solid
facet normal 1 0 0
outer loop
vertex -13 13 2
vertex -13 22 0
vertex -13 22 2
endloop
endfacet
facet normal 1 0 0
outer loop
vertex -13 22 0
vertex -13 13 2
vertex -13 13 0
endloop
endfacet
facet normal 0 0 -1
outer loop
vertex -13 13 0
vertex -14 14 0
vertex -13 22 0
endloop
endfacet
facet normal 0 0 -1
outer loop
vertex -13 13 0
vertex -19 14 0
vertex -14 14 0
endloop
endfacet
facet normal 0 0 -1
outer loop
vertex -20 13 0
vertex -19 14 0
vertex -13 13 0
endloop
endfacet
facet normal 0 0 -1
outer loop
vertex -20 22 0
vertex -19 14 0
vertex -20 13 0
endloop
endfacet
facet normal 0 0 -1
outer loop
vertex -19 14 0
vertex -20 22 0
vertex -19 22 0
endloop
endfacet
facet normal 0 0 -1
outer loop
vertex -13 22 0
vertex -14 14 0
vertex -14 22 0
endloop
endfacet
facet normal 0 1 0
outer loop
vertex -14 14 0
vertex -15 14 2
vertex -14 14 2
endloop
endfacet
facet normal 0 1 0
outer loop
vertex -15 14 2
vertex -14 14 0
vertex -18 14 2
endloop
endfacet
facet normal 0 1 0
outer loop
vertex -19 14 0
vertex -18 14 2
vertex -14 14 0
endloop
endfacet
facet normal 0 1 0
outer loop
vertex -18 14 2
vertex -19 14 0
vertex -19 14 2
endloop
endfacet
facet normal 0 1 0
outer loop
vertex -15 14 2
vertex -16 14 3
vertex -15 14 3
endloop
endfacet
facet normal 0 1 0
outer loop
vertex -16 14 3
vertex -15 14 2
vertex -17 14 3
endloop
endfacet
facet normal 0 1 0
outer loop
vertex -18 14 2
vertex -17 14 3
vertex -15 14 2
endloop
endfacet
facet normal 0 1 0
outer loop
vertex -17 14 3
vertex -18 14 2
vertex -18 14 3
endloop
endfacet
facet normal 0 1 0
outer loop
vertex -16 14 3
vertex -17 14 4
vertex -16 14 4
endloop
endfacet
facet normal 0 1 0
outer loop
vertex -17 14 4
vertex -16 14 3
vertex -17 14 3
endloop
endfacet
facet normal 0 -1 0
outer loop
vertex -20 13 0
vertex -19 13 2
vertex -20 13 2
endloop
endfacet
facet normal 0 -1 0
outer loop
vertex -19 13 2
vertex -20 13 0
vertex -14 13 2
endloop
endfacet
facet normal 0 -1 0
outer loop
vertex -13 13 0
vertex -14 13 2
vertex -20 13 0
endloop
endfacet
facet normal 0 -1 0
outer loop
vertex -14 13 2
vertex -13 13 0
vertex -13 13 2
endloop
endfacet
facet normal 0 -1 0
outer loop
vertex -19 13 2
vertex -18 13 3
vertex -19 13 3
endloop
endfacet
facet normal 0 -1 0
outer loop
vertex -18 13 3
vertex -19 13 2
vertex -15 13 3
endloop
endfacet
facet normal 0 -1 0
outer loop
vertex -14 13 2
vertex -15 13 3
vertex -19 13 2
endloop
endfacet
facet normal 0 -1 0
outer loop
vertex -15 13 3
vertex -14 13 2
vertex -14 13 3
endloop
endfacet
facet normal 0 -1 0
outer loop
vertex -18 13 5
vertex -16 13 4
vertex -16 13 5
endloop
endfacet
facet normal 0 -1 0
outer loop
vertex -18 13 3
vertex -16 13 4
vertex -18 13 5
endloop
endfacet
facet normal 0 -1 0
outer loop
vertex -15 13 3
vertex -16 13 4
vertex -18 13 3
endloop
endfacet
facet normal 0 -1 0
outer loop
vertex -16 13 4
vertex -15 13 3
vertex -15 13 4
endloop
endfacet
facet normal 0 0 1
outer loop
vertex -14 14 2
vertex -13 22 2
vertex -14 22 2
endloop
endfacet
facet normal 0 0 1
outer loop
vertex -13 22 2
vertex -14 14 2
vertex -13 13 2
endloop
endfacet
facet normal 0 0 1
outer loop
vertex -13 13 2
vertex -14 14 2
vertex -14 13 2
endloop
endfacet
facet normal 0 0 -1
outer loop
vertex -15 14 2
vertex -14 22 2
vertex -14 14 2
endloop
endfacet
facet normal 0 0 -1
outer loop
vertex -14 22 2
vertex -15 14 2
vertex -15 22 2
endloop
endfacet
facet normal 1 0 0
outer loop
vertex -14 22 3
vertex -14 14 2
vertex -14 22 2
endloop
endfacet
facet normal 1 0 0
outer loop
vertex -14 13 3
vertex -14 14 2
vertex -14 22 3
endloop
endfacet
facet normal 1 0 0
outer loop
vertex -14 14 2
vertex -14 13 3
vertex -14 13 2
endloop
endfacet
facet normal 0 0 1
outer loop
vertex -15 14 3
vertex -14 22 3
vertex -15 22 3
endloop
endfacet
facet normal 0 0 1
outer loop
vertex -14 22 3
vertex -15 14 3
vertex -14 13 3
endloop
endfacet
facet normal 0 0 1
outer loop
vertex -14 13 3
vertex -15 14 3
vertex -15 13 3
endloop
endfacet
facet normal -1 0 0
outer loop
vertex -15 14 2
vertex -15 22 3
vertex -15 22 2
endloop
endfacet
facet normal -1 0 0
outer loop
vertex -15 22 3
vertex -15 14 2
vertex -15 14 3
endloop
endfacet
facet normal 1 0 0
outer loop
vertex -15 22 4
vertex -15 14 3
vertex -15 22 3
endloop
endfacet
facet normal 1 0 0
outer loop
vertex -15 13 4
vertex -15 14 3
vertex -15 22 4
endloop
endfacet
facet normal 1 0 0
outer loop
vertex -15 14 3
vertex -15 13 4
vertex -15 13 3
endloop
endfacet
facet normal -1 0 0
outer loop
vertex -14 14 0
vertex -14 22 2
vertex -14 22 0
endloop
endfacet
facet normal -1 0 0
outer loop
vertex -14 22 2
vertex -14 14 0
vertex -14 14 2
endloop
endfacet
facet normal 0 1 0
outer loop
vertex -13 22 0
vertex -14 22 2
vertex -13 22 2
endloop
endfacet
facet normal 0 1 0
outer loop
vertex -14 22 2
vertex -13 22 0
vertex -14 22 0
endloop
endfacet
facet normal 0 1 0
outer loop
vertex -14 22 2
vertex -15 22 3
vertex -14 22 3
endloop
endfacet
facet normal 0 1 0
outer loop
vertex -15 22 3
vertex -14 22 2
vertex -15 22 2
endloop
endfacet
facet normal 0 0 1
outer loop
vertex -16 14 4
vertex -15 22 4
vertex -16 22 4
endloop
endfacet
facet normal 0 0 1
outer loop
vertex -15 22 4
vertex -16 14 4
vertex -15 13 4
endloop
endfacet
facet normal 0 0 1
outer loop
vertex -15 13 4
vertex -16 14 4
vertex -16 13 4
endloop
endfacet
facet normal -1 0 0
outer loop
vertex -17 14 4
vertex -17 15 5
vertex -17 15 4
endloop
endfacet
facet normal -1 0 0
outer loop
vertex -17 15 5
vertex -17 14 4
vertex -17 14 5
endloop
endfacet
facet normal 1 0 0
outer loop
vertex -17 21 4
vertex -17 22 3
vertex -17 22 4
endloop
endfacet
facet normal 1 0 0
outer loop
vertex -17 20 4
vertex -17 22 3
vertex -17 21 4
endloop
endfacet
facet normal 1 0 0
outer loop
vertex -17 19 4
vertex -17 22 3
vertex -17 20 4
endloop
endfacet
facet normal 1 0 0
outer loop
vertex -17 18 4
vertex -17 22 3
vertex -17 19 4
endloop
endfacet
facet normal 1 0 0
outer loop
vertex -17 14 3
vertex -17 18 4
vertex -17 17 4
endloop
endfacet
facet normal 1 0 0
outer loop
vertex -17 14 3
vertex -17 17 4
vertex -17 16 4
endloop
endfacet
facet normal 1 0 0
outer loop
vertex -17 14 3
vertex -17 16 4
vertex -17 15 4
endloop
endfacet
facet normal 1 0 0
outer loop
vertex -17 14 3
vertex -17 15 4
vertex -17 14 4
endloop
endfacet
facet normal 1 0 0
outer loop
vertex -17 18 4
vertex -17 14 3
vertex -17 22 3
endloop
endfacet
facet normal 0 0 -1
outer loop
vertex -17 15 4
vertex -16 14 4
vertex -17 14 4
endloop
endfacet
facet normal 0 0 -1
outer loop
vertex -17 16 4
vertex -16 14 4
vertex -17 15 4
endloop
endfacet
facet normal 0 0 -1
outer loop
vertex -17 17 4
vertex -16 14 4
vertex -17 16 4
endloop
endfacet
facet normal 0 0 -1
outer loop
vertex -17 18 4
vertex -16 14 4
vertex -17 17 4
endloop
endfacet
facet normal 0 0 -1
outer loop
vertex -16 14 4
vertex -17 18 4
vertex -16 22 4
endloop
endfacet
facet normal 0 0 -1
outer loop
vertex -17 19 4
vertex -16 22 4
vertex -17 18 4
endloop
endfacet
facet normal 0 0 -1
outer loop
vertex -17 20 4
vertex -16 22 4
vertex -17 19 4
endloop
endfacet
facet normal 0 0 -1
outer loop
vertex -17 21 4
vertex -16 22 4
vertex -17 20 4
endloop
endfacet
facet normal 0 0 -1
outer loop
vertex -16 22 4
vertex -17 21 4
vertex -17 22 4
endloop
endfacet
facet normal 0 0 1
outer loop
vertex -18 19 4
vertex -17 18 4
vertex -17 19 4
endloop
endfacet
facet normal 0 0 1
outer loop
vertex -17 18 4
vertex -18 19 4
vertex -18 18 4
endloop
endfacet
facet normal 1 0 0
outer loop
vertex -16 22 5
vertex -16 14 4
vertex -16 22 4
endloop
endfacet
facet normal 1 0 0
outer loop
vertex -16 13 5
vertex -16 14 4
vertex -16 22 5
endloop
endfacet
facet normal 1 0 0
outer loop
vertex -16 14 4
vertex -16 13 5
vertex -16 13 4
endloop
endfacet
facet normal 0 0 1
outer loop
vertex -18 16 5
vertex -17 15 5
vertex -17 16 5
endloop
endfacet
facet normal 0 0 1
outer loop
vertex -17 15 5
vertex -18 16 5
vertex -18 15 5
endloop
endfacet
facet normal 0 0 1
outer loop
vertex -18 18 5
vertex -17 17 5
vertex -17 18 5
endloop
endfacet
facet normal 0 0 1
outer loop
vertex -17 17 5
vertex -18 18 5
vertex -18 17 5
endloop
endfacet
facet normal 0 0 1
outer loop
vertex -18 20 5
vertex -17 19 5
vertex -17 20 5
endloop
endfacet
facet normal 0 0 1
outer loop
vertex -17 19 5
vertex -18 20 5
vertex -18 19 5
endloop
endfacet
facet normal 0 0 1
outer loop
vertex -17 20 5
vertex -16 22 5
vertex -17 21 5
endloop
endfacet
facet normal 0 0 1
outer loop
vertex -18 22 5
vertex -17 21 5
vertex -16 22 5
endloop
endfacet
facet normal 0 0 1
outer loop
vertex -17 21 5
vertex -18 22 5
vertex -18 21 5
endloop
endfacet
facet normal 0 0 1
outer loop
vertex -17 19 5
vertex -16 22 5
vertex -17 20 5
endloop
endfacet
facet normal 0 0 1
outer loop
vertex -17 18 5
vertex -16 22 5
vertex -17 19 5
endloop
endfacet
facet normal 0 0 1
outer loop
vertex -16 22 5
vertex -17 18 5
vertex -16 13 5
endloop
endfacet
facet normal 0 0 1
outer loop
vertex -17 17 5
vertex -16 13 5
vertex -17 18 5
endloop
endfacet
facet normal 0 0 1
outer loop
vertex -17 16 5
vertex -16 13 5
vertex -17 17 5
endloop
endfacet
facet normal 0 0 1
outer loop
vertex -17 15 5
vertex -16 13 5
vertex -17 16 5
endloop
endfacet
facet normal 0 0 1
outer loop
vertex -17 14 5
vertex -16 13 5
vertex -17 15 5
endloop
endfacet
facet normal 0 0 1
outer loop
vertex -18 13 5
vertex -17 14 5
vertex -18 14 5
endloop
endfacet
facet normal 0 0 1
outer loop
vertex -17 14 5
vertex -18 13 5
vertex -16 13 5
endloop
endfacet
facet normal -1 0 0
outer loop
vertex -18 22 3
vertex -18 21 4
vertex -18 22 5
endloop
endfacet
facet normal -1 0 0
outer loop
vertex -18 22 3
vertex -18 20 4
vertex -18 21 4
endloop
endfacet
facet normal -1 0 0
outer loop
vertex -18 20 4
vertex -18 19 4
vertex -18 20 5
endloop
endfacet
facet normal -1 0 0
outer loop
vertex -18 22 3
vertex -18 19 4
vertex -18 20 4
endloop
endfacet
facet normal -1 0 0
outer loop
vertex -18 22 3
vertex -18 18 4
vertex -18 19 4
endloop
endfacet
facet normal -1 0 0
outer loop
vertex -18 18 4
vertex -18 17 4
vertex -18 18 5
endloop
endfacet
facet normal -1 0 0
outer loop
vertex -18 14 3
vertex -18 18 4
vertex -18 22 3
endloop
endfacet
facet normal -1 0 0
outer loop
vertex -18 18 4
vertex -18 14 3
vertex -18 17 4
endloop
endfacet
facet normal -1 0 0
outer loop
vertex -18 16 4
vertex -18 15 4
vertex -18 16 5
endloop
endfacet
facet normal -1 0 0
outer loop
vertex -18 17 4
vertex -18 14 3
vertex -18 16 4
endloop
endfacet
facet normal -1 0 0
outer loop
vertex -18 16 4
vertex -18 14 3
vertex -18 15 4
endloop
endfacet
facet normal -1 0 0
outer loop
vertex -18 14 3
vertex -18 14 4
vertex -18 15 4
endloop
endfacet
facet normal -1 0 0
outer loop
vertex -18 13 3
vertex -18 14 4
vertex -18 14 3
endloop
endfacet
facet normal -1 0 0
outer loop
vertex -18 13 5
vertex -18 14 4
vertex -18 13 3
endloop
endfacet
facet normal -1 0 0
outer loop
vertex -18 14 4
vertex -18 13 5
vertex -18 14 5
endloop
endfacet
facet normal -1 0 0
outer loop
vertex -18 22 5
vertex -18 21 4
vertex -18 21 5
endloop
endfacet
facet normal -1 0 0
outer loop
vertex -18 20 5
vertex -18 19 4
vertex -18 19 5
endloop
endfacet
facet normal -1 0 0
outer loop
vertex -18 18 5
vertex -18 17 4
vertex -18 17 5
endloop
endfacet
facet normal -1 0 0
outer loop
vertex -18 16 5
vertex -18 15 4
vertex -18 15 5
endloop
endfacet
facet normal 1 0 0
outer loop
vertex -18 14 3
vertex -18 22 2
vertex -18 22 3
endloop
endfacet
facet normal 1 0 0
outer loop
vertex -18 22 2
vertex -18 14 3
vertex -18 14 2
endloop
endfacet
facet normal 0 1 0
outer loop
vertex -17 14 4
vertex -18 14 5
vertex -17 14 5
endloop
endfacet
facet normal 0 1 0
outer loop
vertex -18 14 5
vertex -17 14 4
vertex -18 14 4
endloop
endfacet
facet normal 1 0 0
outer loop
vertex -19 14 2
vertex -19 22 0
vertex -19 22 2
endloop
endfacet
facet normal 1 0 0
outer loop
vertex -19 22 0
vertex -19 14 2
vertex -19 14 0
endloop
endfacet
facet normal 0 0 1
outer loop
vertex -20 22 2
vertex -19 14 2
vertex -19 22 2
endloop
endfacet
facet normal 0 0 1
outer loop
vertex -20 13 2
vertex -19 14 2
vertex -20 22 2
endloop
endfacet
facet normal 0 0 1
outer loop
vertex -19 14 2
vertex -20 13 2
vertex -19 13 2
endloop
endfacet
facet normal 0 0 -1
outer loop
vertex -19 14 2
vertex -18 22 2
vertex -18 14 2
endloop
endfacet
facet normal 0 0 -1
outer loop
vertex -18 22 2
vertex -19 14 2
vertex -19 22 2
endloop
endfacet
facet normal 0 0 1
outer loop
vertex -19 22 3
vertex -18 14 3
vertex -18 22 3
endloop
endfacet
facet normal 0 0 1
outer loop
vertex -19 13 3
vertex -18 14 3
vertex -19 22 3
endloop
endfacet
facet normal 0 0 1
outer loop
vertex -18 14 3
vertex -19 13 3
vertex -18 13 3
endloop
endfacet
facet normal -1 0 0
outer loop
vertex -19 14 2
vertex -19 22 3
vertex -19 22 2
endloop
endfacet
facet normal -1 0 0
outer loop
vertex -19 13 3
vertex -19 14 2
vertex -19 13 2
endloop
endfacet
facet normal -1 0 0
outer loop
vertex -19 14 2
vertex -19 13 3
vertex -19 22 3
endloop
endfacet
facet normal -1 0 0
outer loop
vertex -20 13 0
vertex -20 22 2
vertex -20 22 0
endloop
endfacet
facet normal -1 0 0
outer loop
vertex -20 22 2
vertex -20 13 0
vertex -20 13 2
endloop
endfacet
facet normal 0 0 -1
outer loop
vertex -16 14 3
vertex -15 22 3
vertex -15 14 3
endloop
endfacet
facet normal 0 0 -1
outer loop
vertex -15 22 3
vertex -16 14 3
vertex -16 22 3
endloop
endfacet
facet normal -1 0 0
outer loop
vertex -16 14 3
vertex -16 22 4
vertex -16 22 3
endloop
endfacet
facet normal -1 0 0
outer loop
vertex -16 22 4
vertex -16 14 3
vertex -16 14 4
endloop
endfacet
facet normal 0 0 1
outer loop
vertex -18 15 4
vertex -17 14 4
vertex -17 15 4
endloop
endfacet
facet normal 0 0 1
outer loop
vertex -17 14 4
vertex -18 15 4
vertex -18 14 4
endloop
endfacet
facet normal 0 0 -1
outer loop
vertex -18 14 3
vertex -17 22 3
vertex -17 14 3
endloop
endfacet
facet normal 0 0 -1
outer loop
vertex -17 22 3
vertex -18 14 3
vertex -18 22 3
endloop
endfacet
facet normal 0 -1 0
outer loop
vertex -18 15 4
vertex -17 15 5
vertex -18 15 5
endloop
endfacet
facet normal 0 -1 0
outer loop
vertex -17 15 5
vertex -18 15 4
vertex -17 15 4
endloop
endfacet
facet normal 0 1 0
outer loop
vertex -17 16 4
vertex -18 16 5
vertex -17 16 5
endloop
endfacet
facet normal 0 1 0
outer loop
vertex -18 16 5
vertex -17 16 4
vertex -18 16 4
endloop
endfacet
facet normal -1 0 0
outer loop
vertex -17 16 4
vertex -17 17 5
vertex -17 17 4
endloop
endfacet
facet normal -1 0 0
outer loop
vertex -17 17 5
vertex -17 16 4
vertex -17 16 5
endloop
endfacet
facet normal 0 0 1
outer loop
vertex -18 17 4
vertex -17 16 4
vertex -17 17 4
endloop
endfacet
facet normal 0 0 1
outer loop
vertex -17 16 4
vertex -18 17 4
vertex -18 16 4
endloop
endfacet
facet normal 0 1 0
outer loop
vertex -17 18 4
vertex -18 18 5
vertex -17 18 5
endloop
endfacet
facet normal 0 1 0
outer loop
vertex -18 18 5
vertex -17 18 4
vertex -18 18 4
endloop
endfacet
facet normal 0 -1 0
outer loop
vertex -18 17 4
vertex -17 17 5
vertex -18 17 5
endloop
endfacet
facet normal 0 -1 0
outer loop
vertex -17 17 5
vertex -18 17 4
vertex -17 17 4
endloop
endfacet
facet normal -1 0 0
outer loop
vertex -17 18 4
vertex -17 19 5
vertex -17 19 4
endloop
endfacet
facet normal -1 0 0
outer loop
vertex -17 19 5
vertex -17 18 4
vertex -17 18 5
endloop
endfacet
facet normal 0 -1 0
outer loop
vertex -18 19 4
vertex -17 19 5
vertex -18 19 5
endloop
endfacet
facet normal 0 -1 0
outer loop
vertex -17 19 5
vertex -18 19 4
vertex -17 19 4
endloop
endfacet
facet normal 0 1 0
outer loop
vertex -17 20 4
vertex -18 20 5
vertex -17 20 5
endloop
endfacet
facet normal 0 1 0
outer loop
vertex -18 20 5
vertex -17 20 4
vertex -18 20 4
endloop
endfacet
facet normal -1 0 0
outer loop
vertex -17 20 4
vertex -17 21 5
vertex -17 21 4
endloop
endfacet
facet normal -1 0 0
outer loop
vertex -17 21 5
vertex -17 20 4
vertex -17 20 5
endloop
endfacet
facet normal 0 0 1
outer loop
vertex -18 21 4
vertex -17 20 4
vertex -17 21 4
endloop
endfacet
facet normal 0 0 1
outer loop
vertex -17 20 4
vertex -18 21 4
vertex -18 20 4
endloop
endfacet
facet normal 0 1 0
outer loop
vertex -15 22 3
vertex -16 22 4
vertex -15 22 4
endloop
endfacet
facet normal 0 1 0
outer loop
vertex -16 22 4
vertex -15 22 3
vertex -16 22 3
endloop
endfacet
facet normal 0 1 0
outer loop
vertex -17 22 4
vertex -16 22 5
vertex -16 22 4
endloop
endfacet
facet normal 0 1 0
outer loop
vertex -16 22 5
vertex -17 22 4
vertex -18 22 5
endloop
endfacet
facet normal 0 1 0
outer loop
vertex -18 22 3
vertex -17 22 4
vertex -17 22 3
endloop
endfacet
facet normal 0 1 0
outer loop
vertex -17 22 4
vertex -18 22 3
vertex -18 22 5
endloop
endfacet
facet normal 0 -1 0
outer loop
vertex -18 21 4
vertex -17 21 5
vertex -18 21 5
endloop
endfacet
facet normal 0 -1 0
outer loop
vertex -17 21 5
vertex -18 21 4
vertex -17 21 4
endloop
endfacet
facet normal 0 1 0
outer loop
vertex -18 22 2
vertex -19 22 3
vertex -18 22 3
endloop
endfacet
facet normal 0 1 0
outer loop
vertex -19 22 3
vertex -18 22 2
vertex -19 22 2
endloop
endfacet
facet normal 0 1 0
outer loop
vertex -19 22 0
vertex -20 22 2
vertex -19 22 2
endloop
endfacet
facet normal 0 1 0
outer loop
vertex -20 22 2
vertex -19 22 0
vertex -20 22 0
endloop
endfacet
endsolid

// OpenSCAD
fastRender = true;

$fn = 8;
module minecraftCube(x,y,z,colorIn)
{
    if(fastRender == true)
    {
        color(colorIn) translate([x,y,z]) cube(1);
    }
    else
    {
        color(colorIn) translate([x,y,z])
        minkowski()
        {
            cube(0.65);
            sphere(d = 0.65);
        }
    }
}
// chunkX = 12, chunkZ = 5, offsetX = 0, offsetZ = 0
minecraftCube(-14,13,0,[0.3200,0.3200,0.3200]);// granite
minecraftCube(-14,13,1,[0.3200,0.3200,0.3200]);// granite
minecraftCube(-15,13,0,[0.3200,0.3200,0.3200]);// granite
minecraftCube(-15,13,1,[0.3200,0.3200,0.3200]);// granite
minecraftCube(-15,13,2,[0.3200,0.3200,0.3200]);// granite
minecraftCube(-14,14,0,[0.3200,0.3200,0.3200]);// granite
minecraftCube(-14,14,1,[0.3200,0.3200,0.3200]);// granite
minecraftCube(-15,14,2,[0.3200,0.3200,0.3200]);// granite
minecraftCube(-14,15,0,[0.3200,0.3200,0.3200]);// granite
minecraftCube(-14,15,1,[0.3200,0.3200,0.3200]);// granite
minecraftCube(-15,15,2,[0.3200,0.3200,0.3200]);// granite
// granite: 11
// air: 3061
// chunkX = 12, chunkZ = 6, offsetX = 0, offsetZ = 16
minecraftCube(-14,16,0,[0.3200,0.3200,0.3200]);// granite
minecraftCube(-14,16,1,[0.3200,0.3200,0.3200]);// granite
minecraftCube(-15,16,2,[0.3200,0.3200,0.3200]);// granite
minecraftCube(-14,17,0,[0.3200,0.3200,0.3200]);// granite
minecraftCube(-14,17,1,[0.3200,0.3200,0.3200]);// granite
minecraftCube(-15,17,2,[0.3200,0.3200,0.3200]);// granite
minecraftCube(-14,18,0,[0.3200,0.3200,0.3200]);// granite
minecraftCube(-14,18,1,[0.3200,0.3200,0.3200]);// granite
minecraftCube(-15,18,2,[0.3200,0.3200,0.3200]);// granite
minecraftCube(-14,19,0,[0.3200,0.3200,0.3200]);// granite
minecraftCube(-14,19,1,[0.3200,0.3200,0.3200]);// granite
minecraftCube(-15,19,2,[0.3200,0.3200,0.3200]);// granite
minecraftCube(-14,20,0,[0.3200,0.3200,0.3200]);// granite
minecraftCube(-14,20,1,[0.3200,0.3200,0.3200]);// granite
minecraftCube(-15,20,2,[0.3200,0.3200,0.3200]);// granite
minecraftCube(-14,21,0,[0.3200,0.3200,0.3200]);// granite
minecraftCube(-14,21,1,[0.3200,0.3200,0.3200]);// granite
minecraftCube(-15,21,2,[0.3200,0.3200,0.3200]);// granite
// granite: 18
// air: 3054
// chunkX = 13, chunkZ = 5, offsetX = -16, offsetZ = 0
minecraftCube(-16,13,0,[0.3200,0.3200,0.3200]);// granite
minecraftCube(-16,13,1,[0.3200,0.3200,0.3200]);// granite
minecraftCube(-16,13,2,[0.3200,0.3200,0.3200]);// granite
minecraftCube(-16,13,3,[0.3200,0.3200,0.3200]);// granite
minecraftCube(-17,13,0,[0.3200,0.3200,0.3200]);// granite
minecraftCube(-17,13,1,[0.3200,0.3200,0.3200]);// granite
minecraftCube(-17,13,2,[0.3200,0.3200,0.3200]);// granite
minecraftCube(-17,13,3,[0.3200,0.3200,0.3200]);// granite
minecraftCube(-17,13,4,[0.3200,0.3200,0.3200]);// granite
minecraftCube(-18,13,0,[0.3200,0.3200,0.3200]);// granite
minecraftCube(-18,13,1,[0.3200,0.3200,0.3200]);// granite
minecraftCube(-18,13,2,[0.3200,0.3200,0.3200]);// granite
minecraftCube(-18,13,3,[0.3200,0.3200,0.3200]);// granite
minecraftCube(-18,13,4,[0.3021,0.4544,0.1856]);// grass_block
minecraftCube(-19,13,0,[0.3200,0.3200,0.3200]);// granite
minecraftCube(-19,13,1,[0.3200,0.3200,0.3200]);// granite
minecraftCube(-19,13,2,[0.3200,0.3200,0.3200]);// granite
minecraftCube(-20,13,0,[0.3200,0.3200,0.3200]);// granite
minecraftCube(-20,13,1,[0.3200,0.3200,0.3200]);// granite
minecraftCube(-16,14,3,[0.3200,0.3200,0.3200]);// granite
minecraftCube(-17,14,4,[0.3200,0.3200,0.3200]);// granite
minecraftCube(-18,14,3,[0.3200,0.3200,0.3200]);// granite
minecraftCube(-19,14,2,[0.3200,0.3200,0.3200]);// granite
minecraftCube(-20,14,0,[0.3200,0.3200,0.3200]);// granite
minecraftCube(-20,14,1,[0.3200,0.3200,0.3200]);// granite
minecraftCube(-16,15,3,[0.3200,0.3200,0.3200]);// granite
minecraftCube(-17,15,4,[0.3200,0.3200,0.3200]);// granite
minecraftCube(-18,15,3,[0.3200,0.3200,0.3200]);// granite
minecraftCube(-18,15,4,[0.3021,0.4544,0.1856]);// grass_block
minecraftCube(-19,15,2,[0.3200,0.3200,0.3200]);// granite
minecraftCube(-20,15,0,[0.3200,0.3200,0.3200]);// granite
minecraftCube(-20,15,1,[0.3200,0.3200,0.3200]);// granite
// granite: 30
// sandstone_stairs: 1
  // unhandled type!!!!
// grass_block: 2
// air: 3039
// chunkX = 13, chunkZ = 6, offsetX = -16, offsetZ = 16
minecraftCube(-16,16,3,[0.3200,0.3200,0.3200]);// granite
minecraftCube(-17,16,4,[0.3200,0.3200,0.3200]);// granite
minecraftCube(-18,16,3,[0.3200,0.3200,0.3200]);// granite
minecraftCube(-19,16,2,[0.3200,0.3200,0.3200]);// granite
minecraftCube(-20,16,0,[0.3200,0.3200,0.3200]);// granite
minecraftCube(-20,16,1,[0.3200,0.3200,0.3200]);// granite
minecraftCube(-16,17,3,[0.3200,0.3200,0.3200]);// granite
minecraftCube(-17,17,4,[0.3200,0.3200,0.3200]);// granite
minecraftCube(-18,17,3,[0.3200,0.3200,0.3200]);// granite
minecraftCube(-18,17,4,[0.3021,0.4544,0.1856]);// grass_block
minecraftCube(-19,17,2,[0.3200,0.3200,0.3200]);// granite
minecraftCube(-20,17,0,[0.3200,0.3200,0.3200]);// granite
minecraftCube(-20,17,1,[0.3200,0.3200,0.3200]);// granite
minecraftCube(-16,18,3,[0.3200,0.3200,0.3200]);// granite
minecraftCube(-17,18,4,[0.3200,0.3200,0.3200]);// granite
minecraftCube(-18,18,3,[0.3200,0.3200,0.3200]);// granite
minecraftCube(-19,18,2,[0.3200,0.3200,0.3200]);// granite
minecraftCube(-20,18,0,[0.3200,0.3200,0.3200]);// granite
minecraftCube(-20,18,1,[0.3200,0.3200,0.3200]);// granite
minecraftCube(-16,19,3,[0.3200,0.3200,0.3200]);// granite
minecraftCube(-17,19,4,[0.3200,0.3200,0.3200]);// granite
minecraftCube(-18,19,3,[0.3200,0.3200,0.3200]);// granite
minecraftCube(-18,19,4,[0.3021,0.4544,0.1856]);// grass_block
minecraftCube(-19,19,2,[0.3200,0.3200,0.3200]);// granite
minecraftCube(-20,19,0,[0.3200,0.3200,0.3200]);// granite
minecraftCube(-20,19,1,[0.3200,0.3200,0.3200]);// granite
minecraftCube(-16,20,3,[0.3200,0.3200,0.3200]);// granite
minecraftCube(-17,20,4,[0.3200,0.3200,0.3200]);// granite
minecraftCube(-18,20,3,[0.3200,0.3200,0.3200]);// granite
minecraftCube(-19,20,2,[0.3200,0.3200,0.3200]);// granite
minecraftCube(-20,20,0,[0.3200,0.3200,0.3200]);// granite
minecraftCube(-20,20,1,[0.3200,0.3200,0.3200]);// granite
minecraftCube(-16,21,3,[0.3200,0.3200,0.3200]);// granite
minecraftCube(-17,21,4,[0.3200,0.3200,0.3200]);// granite
minecraftCube(-18,21,3,[0.3200,0.3200,0.3200]);// granite
minecraftCube(-18,21,4,[0.3021,0.4544,0.1856]);// grass_block
minecraftCube(-19,21,2,[0.3200,0.3200,0.3200]);// granite
minecraftCube(-20,21,0,[0.3200,0.3200,0.3200]);// granite
minecraftCube(-20,21,1,[0.3200,0.3200,0.3200]);// granite
// granite: 36
// sandstone_stairs: 3
  // unhandled type!!!!
// grass_block: 3
// air: 3030
